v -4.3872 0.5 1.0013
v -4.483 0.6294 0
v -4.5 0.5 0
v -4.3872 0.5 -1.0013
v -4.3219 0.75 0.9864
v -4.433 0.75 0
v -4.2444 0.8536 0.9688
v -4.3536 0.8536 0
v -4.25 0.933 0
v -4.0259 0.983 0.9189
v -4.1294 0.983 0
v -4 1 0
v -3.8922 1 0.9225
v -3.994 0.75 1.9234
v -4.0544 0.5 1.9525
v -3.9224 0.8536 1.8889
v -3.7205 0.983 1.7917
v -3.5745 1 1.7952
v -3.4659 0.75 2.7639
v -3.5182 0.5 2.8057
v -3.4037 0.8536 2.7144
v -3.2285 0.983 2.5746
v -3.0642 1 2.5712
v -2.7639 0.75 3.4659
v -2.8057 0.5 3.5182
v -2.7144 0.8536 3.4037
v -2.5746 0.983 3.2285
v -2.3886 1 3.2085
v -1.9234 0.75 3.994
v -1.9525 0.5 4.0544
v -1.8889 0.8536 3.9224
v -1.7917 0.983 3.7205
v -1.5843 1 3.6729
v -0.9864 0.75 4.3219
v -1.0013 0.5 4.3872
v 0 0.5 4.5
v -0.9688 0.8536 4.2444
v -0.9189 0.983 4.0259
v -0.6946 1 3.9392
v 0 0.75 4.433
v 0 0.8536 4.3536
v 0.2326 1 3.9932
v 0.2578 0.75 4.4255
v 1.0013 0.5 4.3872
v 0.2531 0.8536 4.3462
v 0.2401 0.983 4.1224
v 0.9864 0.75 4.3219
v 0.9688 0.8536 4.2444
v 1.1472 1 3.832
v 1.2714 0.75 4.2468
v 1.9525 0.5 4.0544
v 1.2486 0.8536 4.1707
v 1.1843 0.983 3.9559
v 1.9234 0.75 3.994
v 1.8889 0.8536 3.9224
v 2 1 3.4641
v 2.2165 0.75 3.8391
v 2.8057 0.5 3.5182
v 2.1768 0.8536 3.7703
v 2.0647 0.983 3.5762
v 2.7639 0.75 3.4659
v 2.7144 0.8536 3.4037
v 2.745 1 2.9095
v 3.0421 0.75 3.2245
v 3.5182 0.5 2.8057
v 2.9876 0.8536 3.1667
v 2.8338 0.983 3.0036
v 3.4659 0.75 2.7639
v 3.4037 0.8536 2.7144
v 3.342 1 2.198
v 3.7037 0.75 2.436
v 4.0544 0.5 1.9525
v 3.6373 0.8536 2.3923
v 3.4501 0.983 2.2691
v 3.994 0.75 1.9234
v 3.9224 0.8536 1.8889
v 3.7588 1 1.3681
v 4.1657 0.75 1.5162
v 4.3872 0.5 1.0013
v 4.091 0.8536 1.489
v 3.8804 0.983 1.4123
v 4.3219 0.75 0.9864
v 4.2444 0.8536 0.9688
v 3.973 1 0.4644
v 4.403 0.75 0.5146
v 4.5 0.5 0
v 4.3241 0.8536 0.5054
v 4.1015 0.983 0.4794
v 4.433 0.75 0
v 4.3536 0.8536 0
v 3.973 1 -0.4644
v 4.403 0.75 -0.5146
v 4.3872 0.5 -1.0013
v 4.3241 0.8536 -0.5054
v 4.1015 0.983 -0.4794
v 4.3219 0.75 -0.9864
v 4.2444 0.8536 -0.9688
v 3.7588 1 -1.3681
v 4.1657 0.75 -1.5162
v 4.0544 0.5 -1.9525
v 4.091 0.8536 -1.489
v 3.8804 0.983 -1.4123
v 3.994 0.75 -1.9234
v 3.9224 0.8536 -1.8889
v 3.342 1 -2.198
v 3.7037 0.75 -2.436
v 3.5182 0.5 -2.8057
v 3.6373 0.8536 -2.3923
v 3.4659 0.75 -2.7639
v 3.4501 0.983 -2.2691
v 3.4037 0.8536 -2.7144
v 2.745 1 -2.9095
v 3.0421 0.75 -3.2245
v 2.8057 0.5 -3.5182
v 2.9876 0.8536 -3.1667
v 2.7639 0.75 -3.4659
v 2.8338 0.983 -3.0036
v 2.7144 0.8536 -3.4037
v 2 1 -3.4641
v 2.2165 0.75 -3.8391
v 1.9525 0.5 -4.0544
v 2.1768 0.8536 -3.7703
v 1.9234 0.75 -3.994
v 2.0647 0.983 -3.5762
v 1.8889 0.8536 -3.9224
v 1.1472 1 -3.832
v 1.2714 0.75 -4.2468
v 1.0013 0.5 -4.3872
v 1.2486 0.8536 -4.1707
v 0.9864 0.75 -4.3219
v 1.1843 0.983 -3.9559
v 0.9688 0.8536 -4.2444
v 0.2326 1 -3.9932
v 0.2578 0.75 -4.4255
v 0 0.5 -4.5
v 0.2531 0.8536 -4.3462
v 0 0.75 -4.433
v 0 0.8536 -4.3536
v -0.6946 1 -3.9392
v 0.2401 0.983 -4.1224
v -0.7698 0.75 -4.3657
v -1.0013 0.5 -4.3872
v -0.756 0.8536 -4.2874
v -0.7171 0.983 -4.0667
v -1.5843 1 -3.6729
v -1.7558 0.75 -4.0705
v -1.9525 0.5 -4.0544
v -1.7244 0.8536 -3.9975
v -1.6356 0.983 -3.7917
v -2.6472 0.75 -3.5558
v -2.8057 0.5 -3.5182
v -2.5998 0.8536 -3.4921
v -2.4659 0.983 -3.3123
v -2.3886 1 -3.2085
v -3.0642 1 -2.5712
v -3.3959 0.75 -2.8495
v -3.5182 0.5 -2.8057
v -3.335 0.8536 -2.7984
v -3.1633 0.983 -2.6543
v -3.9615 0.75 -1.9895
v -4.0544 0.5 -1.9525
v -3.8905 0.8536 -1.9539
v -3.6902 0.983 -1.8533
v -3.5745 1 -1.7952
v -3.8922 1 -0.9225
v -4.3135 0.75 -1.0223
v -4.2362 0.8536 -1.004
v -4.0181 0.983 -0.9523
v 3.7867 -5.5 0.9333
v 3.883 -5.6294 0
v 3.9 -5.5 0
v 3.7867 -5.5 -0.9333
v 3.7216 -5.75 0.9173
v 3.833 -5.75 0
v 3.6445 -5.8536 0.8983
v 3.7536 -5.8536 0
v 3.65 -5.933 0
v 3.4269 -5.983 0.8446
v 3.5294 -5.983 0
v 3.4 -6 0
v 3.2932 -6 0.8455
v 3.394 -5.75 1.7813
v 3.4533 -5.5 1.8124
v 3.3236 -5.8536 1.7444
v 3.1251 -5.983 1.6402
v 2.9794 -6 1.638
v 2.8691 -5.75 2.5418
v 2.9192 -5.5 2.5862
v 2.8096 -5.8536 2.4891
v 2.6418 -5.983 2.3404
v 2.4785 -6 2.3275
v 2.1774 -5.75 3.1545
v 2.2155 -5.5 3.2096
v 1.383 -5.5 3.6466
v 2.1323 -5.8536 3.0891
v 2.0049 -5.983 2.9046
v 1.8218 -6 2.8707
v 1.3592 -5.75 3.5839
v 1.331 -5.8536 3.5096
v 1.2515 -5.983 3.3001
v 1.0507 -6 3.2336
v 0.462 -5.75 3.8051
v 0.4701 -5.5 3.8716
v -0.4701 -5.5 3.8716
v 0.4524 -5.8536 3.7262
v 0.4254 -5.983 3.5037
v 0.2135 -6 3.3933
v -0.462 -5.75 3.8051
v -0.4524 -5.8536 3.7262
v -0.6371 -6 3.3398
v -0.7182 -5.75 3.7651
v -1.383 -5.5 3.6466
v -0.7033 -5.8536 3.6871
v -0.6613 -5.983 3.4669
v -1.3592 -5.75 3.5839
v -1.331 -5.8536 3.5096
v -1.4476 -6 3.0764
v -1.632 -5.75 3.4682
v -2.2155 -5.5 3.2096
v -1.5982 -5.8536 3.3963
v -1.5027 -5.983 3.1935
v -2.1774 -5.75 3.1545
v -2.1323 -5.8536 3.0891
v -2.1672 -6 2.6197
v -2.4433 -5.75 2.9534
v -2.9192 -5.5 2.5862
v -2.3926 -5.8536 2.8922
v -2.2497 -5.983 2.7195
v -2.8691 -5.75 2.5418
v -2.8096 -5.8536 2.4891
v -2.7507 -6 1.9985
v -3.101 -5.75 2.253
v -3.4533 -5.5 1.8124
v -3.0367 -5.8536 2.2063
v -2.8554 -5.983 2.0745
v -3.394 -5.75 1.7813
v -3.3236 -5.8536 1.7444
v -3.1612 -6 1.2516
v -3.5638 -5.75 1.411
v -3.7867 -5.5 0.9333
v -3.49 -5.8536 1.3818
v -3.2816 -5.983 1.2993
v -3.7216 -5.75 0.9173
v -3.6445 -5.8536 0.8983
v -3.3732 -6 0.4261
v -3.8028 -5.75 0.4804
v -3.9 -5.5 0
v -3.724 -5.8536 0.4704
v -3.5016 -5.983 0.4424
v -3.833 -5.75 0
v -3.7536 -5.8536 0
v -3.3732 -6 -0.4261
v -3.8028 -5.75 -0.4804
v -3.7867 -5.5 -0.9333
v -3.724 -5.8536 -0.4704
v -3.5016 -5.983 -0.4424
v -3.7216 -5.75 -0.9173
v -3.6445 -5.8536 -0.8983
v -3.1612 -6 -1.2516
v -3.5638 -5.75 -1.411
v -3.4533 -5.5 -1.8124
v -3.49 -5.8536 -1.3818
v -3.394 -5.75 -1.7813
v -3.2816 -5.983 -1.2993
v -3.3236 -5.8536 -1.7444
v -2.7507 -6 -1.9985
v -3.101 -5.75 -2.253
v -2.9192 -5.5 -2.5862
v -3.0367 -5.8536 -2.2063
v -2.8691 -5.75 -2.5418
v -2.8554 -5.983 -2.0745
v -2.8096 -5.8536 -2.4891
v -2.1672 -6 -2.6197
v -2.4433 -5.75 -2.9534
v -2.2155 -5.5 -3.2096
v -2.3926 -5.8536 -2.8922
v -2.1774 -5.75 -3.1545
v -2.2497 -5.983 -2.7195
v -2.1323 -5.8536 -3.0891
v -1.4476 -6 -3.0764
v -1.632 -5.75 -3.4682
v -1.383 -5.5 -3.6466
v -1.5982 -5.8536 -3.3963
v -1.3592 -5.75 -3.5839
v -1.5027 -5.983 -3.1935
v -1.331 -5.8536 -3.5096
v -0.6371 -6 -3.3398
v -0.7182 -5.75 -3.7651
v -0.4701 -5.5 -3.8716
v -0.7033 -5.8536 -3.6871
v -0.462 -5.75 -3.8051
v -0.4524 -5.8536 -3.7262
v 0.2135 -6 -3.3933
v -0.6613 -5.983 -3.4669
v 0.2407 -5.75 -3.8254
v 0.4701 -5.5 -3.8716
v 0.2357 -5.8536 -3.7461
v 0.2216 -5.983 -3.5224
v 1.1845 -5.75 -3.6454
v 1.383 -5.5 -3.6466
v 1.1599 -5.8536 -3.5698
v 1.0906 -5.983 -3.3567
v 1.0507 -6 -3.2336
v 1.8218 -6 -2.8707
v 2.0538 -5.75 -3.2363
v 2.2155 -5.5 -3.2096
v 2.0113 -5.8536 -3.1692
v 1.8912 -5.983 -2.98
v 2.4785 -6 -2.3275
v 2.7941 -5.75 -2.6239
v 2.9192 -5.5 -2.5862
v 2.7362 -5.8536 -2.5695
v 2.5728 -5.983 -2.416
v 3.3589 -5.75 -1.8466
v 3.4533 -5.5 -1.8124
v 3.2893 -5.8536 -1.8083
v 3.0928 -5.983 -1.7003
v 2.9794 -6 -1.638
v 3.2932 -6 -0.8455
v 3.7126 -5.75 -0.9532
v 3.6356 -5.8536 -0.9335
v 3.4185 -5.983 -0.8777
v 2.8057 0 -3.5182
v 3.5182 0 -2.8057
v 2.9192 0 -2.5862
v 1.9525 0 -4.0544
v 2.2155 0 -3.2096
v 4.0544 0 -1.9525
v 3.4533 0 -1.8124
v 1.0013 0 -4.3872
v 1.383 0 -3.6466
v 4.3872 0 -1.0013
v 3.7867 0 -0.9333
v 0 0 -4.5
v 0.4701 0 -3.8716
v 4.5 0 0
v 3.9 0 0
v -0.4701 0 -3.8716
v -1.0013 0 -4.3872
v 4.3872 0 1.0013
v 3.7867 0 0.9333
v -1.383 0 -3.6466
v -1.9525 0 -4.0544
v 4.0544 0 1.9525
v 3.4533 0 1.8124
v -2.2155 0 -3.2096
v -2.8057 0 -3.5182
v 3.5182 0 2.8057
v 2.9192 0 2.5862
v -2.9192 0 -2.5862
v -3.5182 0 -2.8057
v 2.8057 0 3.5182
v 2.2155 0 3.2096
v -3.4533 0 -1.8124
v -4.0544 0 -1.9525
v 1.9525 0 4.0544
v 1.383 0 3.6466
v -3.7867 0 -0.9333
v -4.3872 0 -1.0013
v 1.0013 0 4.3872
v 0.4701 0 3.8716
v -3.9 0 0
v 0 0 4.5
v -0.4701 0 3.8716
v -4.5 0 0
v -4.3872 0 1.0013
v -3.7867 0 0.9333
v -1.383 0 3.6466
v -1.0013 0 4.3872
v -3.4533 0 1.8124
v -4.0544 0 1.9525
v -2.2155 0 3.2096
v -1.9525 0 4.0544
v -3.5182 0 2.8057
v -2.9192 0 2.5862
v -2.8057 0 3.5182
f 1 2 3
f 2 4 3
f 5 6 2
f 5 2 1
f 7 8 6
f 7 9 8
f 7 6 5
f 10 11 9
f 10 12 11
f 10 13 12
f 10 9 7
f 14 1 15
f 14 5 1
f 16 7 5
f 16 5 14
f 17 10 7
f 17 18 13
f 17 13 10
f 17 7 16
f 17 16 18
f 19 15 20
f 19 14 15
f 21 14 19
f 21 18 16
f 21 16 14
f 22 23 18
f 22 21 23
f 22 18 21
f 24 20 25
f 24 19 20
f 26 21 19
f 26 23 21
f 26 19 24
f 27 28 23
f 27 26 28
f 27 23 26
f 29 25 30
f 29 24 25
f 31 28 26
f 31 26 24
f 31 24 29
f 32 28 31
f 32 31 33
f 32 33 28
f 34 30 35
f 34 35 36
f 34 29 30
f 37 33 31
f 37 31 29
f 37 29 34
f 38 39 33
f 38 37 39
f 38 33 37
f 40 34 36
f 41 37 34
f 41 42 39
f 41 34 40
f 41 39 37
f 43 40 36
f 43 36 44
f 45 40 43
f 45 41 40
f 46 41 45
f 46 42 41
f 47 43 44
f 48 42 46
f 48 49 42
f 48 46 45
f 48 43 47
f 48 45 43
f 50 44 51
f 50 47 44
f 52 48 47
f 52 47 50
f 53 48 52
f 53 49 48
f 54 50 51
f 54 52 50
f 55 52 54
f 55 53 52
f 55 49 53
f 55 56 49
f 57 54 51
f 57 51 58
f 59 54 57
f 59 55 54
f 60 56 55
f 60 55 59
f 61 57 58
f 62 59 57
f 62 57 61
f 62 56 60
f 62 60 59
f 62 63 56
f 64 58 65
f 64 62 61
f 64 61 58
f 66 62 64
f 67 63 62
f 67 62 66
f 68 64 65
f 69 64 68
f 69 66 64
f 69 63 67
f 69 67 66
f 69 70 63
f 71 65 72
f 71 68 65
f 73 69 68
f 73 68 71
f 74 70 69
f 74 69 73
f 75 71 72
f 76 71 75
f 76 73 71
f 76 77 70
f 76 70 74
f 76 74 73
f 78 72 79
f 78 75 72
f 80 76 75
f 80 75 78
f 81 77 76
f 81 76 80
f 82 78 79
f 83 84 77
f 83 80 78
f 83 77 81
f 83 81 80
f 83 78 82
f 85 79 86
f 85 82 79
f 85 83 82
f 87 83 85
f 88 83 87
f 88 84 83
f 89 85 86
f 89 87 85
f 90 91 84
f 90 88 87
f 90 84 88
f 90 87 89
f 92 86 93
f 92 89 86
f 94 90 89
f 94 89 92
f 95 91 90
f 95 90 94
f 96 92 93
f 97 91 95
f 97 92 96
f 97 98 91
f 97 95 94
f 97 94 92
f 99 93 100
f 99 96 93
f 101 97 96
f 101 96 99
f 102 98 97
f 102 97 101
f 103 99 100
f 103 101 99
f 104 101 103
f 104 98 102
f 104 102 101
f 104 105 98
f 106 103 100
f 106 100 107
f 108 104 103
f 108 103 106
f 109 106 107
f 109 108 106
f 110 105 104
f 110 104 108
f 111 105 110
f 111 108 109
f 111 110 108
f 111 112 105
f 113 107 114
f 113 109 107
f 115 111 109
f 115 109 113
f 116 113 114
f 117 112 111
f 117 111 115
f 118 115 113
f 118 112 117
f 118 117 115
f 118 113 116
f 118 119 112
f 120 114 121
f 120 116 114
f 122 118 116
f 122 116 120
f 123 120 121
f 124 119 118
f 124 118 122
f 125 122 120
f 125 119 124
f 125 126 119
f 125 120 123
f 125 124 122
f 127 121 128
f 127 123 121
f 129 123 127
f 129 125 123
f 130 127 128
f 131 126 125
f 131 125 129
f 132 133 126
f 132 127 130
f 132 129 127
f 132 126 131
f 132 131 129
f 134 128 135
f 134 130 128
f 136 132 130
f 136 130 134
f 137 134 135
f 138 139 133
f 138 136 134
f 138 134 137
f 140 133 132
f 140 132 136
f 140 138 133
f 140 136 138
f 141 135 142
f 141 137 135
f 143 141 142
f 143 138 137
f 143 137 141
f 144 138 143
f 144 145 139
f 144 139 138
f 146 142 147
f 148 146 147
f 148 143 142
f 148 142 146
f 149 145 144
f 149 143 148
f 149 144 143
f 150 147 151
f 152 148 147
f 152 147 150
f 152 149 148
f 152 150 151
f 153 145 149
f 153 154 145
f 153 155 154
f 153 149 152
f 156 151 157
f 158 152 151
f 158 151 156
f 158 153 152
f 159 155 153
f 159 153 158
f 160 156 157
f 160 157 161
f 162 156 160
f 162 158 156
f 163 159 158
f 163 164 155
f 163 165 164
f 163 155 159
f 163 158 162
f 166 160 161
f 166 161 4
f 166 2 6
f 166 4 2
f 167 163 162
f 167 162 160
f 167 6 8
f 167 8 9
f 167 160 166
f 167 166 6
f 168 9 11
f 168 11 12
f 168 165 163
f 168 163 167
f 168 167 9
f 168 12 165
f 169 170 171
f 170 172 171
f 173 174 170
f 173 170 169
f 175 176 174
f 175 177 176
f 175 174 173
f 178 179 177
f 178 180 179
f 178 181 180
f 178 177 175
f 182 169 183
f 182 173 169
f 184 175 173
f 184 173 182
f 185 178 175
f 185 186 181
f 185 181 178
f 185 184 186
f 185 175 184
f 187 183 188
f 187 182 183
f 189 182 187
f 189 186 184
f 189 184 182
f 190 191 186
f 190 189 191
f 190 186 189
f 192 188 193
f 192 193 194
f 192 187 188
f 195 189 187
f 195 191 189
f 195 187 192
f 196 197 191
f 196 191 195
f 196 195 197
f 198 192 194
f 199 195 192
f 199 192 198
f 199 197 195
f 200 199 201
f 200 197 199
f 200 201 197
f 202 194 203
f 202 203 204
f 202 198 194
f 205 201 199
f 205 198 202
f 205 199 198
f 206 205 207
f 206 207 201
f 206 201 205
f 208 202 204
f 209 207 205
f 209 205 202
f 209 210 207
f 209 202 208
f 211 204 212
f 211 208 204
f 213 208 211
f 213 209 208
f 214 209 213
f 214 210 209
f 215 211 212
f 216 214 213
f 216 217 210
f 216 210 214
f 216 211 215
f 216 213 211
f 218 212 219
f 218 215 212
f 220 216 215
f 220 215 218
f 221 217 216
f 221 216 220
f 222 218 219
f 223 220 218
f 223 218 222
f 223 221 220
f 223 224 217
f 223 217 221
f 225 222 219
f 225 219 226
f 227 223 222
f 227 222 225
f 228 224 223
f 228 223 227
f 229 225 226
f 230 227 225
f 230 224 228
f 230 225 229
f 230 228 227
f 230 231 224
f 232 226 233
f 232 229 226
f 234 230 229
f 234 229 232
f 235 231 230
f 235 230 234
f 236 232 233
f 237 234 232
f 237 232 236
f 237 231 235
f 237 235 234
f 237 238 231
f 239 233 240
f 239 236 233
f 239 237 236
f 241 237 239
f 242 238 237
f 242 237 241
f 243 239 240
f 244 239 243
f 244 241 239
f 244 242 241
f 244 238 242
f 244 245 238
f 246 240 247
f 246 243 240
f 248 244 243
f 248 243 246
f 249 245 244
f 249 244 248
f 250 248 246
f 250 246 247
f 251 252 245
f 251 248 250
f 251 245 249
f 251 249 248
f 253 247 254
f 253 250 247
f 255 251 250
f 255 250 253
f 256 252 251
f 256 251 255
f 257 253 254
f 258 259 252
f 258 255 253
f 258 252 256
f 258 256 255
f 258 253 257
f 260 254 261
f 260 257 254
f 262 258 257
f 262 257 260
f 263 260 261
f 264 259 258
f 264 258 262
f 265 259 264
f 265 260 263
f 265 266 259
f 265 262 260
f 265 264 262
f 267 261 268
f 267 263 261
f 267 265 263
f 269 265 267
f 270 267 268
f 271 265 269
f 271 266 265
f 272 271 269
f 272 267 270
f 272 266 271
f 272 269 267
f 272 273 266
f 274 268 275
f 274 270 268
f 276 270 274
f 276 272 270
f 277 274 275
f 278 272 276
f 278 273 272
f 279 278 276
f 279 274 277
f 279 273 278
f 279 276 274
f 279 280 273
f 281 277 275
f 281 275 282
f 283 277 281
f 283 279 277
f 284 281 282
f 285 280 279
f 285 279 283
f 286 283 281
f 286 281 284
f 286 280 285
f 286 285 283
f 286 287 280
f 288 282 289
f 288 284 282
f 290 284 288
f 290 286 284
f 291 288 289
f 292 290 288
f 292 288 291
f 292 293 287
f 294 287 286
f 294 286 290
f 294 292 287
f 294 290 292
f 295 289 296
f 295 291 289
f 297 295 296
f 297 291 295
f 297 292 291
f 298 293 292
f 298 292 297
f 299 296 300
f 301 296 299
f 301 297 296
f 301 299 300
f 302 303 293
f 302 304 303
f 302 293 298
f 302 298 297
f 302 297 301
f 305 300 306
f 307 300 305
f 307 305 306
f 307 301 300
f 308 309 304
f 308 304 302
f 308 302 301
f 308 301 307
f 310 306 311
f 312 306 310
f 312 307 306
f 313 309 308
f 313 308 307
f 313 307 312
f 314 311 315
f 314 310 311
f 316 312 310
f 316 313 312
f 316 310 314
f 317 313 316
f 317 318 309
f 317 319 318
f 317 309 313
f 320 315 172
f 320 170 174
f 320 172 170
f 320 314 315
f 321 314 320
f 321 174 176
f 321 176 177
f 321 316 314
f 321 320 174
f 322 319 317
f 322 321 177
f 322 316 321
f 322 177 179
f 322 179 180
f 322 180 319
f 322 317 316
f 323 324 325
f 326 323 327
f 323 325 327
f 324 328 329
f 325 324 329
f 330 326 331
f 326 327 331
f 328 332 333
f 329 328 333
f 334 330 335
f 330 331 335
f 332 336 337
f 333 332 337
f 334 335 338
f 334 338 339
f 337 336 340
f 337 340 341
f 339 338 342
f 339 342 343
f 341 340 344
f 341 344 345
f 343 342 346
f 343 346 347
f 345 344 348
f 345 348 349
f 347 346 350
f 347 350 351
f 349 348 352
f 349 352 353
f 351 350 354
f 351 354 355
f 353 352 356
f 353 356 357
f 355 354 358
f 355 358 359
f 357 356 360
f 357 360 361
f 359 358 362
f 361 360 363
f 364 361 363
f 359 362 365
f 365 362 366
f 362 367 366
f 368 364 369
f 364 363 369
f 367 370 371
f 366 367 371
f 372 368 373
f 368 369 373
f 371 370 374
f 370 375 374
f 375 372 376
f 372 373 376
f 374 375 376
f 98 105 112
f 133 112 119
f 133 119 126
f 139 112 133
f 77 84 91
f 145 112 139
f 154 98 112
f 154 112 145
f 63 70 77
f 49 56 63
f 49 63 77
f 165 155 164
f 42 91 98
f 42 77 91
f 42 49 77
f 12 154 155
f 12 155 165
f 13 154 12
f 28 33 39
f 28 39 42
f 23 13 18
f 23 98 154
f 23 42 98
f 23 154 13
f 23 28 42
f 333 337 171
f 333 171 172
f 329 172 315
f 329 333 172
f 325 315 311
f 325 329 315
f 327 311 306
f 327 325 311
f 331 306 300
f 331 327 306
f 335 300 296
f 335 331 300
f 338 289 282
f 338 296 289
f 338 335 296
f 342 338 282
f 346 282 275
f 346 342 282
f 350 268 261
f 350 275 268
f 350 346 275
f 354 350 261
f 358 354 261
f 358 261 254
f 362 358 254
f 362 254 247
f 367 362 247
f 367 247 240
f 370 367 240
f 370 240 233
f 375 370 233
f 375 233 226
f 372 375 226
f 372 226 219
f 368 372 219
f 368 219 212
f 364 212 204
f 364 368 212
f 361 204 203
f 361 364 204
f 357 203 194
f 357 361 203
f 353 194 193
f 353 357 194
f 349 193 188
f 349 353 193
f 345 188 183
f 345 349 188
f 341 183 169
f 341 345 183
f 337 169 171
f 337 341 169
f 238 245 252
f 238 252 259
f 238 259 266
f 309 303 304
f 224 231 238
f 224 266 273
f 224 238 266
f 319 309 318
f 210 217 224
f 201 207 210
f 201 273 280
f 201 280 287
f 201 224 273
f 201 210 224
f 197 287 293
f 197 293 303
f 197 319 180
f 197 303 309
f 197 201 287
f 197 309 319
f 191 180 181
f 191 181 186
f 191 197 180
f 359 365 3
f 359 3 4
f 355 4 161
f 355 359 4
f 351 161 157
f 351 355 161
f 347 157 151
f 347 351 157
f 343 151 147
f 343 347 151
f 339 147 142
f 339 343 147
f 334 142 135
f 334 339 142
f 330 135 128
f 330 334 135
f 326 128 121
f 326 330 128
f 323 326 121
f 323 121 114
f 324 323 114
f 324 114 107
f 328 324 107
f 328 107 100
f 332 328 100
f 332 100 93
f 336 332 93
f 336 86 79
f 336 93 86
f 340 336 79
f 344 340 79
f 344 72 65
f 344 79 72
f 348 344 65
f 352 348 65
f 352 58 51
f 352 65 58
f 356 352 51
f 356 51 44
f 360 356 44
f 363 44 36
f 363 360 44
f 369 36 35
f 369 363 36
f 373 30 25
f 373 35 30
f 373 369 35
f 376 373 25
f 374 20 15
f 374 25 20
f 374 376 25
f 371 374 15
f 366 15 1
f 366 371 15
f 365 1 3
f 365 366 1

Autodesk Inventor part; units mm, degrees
ref_plane "YZ Plane" through (0, 0, 0) normal (1, 0, 0) x (0, 1, 0)
ref_plane "XZ Plane" through (0, 0, 0) normal (0, 1, 0) x (-1, 0, 0)
ref_plane "XY Plane" through (0, 0, 0) normal (0, 0, 1) x (1, 0, 0)
sketch "Boceto1" plane through (0, 0, 0) normal (0, 1, 0) x (-1, 0, 0)
  circle A0 centre (0, 0) radius 4.5
  dimension "d0" = 9
extrude "Extrusión1" add sketch "Boceto1" along normal blind 1
fillet "Empalme1" radius 0.5 1 edges at (4.5, 1, 0)
sketch "Boceto2" plane through (0, 0, 0) normal (0, -1, 0) x (1, 0, 0)
  circle A0 centre (0, 0) radius 3.9
  dimension "d4" = 7.8
extrude "Extrusión2" add sketch "Boceto2" along normal blind 6
fillet "Empalme2" radius 0.5 1 edges at (-3.9, -6, 0)
properties part number "sensor"
